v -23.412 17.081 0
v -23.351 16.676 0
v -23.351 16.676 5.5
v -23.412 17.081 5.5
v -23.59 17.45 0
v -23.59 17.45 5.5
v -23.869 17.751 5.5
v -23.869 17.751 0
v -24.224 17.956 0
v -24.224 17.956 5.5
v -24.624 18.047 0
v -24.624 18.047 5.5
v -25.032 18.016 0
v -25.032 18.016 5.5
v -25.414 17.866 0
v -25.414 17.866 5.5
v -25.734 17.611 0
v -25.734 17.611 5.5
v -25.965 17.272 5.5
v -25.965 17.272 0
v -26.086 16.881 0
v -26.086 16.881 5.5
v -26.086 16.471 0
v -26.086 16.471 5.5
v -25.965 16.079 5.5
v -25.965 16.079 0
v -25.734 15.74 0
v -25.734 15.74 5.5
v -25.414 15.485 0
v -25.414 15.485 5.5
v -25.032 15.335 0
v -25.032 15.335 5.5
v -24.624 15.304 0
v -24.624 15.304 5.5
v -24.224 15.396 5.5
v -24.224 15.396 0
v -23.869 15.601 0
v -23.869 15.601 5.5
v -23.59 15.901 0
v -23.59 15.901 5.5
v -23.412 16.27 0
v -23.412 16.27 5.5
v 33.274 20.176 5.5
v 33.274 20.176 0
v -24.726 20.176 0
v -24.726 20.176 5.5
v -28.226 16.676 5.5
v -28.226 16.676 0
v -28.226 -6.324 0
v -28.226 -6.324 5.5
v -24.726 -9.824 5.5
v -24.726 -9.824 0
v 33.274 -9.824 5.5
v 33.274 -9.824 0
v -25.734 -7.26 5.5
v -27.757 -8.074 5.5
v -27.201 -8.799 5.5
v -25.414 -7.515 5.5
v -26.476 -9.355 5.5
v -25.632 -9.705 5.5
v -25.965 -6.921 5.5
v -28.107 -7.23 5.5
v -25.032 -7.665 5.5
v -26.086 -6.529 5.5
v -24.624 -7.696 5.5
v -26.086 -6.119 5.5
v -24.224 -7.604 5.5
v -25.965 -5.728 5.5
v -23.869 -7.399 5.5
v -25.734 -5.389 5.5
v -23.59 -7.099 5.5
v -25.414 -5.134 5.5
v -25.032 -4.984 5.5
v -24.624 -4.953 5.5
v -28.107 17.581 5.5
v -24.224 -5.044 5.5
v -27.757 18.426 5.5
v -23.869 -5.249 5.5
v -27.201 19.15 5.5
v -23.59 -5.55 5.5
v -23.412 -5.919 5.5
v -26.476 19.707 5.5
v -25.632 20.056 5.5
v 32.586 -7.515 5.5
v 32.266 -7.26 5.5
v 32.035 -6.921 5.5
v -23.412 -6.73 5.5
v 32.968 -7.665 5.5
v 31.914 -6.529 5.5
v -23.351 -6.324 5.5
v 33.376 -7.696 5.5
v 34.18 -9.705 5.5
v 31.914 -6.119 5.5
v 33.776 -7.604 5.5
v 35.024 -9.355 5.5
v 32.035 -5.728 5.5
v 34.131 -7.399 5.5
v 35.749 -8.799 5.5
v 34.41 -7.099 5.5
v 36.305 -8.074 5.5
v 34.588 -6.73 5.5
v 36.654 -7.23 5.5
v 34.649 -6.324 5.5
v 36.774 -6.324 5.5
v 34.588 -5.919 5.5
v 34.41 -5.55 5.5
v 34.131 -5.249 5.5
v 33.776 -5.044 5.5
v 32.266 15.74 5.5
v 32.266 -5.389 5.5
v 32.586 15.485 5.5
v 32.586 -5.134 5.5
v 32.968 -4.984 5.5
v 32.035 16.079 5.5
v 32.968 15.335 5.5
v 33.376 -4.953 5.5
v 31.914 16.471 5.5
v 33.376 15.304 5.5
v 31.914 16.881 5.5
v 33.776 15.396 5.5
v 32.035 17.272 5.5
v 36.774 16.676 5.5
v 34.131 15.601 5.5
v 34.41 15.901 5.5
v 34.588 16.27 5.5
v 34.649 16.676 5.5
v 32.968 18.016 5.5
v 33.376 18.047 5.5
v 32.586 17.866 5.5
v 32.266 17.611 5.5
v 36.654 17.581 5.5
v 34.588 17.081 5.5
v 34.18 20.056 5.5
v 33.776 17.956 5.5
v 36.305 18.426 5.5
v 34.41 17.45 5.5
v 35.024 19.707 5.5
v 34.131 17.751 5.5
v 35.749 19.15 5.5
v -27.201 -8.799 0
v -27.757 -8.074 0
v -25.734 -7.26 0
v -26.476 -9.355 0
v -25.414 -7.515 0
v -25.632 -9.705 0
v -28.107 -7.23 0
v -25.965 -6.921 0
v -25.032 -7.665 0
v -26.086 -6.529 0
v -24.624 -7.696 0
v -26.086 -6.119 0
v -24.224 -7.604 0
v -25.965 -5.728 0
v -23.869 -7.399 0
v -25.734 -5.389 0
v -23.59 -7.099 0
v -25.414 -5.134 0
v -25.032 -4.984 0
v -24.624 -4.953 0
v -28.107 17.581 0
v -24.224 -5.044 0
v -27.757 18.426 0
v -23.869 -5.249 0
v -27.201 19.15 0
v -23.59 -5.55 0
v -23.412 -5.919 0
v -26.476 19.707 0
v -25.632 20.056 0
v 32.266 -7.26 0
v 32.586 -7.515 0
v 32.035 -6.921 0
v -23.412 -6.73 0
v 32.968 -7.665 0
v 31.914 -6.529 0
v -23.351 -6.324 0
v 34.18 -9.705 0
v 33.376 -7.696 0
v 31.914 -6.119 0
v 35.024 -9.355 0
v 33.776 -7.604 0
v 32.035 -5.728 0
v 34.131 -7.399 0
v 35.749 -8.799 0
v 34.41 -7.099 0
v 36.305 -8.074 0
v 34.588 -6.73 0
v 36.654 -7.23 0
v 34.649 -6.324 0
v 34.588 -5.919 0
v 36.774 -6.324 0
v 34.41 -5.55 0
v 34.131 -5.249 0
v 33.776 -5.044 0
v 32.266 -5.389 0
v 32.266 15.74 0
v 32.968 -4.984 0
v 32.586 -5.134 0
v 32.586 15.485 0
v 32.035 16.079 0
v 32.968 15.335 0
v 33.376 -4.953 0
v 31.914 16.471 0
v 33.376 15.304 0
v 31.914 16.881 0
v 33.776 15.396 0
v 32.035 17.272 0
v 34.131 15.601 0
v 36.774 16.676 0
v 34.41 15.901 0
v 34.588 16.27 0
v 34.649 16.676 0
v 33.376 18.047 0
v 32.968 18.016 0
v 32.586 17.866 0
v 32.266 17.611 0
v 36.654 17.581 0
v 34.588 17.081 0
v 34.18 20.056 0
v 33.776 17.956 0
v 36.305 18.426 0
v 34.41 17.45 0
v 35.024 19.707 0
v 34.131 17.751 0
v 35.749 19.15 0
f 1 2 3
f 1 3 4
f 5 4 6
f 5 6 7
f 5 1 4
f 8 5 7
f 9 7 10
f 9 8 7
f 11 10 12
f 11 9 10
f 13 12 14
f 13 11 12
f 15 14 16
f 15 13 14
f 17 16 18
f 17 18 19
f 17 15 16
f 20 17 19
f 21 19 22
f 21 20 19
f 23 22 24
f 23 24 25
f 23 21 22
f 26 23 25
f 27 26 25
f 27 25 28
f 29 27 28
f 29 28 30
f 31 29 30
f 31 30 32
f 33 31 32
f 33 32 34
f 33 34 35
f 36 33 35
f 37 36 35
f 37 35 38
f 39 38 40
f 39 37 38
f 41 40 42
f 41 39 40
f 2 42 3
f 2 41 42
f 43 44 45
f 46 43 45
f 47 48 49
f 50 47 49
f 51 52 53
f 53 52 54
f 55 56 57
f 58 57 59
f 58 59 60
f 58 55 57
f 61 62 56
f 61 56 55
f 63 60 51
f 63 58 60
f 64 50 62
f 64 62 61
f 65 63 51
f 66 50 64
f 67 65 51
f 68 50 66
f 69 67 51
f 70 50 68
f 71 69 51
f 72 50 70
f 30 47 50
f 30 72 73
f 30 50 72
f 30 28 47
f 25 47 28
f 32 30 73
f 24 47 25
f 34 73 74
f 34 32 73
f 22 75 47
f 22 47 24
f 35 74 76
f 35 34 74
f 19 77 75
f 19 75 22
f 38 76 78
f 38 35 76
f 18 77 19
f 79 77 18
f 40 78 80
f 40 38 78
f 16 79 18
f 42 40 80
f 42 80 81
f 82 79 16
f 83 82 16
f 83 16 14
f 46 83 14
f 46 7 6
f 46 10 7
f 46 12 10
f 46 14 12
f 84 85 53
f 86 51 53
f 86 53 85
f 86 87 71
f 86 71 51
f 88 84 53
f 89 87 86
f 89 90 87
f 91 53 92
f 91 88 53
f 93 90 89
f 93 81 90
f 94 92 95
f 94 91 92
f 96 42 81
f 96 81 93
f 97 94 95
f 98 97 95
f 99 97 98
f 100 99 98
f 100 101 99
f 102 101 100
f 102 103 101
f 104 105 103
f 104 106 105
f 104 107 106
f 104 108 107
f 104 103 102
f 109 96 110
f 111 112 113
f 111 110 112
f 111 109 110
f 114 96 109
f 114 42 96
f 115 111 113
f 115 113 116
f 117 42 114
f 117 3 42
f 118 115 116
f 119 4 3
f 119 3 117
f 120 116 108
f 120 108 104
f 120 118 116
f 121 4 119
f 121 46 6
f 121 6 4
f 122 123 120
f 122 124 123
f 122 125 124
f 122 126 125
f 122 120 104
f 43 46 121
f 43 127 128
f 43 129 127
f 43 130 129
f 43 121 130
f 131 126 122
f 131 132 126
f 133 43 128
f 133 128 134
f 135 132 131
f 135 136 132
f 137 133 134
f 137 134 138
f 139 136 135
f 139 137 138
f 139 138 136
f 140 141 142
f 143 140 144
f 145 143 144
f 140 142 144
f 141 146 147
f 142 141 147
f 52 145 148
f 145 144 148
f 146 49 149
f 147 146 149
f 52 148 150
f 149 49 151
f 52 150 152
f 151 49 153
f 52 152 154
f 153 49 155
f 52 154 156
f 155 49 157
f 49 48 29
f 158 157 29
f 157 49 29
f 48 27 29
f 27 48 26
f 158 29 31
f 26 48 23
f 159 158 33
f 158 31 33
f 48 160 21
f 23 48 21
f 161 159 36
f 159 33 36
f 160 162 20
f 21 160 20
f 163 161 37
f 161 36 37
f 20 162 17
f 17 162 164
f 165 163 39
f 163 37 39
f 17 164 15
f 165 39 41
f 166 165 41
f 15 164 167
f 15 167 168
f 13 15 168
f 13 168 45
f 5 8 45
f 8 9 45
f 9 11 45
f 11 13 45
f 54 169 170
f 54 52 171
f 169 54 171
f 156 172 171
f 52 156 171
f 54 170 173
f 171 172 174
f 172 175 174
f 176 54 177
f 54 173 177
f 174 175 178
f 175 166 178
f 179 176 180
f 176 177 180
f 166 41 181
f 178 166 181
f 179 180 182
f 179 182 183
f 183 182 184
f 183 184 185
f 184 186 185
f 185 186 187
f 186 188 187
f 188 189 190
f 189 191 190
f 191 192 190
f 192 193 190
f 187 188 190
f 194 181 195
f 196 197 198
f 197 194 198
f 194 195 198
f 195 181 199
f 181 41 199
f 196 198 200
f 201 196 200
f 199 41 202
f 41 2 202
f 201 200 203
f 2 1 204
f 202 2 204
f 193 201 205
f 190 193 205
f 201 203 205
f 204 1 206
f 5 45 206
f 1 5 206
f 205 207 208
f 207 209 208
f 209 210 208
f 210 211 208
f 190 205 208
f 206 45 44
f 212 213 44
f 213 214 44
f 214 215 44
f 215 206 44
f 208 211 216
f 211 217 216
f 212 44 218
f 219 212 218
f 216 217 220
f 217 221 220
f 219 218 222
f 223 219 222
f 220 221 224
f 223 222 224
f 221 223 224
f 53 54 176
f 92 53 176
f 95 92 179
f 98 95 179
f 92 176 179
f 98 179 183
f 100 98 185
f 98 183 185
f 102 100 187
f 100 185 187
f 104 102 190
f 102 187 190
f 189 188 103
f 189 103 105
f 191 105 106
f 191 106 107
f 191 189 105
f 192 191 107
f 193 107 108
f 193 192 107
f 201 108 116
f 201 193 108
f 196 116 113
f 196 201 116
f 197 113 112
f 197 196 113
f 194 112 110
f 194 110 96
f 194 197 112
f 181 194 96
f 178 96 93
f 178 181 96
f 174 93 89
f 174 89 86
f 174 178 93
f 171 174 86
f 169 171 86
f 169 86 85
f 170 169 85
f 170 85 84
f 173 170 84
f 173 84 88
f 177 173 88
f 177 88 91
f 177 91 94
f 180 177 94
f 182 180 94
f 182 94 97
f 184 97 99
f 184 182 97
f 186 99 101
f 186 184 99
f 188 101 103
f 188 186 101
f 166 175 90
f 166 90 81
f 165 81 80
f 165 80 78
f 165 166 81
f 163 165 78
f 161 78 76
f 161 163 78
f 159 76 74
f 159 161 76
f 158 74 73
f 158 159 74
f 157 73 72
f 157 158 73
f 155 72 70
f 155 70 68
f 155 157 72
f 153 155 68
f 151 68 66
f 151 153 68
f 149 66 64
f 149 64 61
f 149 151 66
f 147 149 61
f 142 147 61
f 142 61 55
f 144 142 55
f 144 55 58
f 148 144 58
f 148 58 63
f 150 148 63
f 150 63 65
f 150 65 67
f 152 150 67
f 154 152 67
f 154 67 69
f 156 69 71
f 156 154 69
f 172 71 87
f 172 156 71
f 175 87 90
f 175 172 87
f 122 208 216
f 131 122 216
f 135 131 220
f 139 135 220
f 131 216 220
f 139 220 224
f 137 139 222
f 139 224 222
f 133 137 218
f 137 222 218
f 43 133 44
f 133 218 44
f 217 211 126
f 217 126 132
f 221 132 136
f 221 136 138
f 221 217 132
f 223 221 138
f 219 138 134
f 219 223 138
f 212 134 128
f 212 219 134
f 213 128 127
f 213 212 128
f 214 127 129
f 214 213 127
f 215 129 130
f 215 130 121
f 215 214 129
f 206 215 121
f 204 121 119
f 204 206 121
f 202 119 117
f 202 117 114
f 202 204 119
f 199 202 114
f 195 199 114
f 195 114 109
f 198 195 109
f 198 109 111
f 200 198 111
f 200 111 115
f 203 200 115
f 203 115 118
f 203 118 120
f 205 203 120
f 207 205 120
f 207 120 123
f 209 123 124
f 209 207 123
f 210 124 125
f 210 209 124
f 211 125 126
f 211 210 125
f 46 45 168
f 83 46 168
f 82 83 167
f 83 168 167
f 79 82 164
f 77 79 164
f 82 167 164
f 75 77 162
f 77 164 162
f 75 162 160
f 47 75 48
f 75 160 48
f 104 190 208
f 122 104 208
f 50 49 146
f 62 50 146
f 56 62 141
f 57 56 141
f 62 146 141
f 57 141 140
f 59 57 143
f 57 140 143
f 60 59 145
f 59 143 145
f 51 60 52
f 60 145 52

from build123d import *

# Parameters (mm, degrees)
F0_R     = 1.75
F0_R_2   = 1.375
F1_DEPTH = 5.5


with BuildPart() as f1:
    # F0 (on Top) → F1 (new body)
    with BuildSketch(Plane.XY):
        with BuildLine():
            Line((33.2736441009, 20.1755892562), (-24.7263558991, 20.1755892562))
            ThreePointArc((-24.7263558991, 20.1755892562), (-27.2012296333, 19.1504629903), (-28.2263558991, 16.6755892562))
            Line((-28.2263558991, 16.6755892562), (-28.2263558991, -6.3244107438))
            ThreePointArc((-28.2263558991, -6.3244107438), (-27.2012296333, -8.799284478), (-24.7263558991, -9.8244107438))
            Line((-24.7263558991, -9.8244107438), (33.2736441009, -9.8244107438))
            ThreePointArc((33.2736441009, -9.8244107438), (35.748517835, -8.799284478), (36.7736441009, -6.3244107438))
            Line((36.7736441009, -6.3244107438), (36.7736441009, 16.6755892562))
            ThreePointArc((36.7736441009, 16.6755892562), (35.748517835, 19.1504629903), (33.2736441009, 20.1755892562))
        make_face()
        with Locations((-24.7263558991, -6.3244107438)):
            Circle(F0_R, mode=Mode.SUBTRACT)
        with Locations((33.2736441009, -6.3244107438)):
            Circle(F0_R, mode=Mode.SUBTRACT)
        with Locations((-24.7263558991, 16.6755892562)):
            Circle(F0_R, mode=Mode.SUBTRACT)
        with Locations((33.2736441009, 16.6755892562)):
            Circle(F0_R, mode=Mode.SUBTRACT)
        with Locations((-24.7263558991, -6.3244107438)):
            Circle(F0_R)
        with Locations((-24.7263558991, -6.3244107438)):
            Circle(F0_R_2, mode=Mode.SUBTRACT)
        with Locations((-24.7263558991, 16.6755892562)):
            Circle(F0_R)
        with Locations((-24.7263558991, 16.6755892562)):
            Circle(F0_R_2, mode=Mode.SUBTRACT)
        with Locations((33.2736441009, -6.3244107438)):
            Circle(F0_R)
        with Locations((33.2736441009, -6.3244107438)):
            Circle(F0_R_2, mode=Mode.SUBTRACT)
        with Locations((33.2736441009, 16.6755892562)):
            Circle(F0_R)
        with Locations((33.2736441009, 16.6755892562)):
            Circle(F0_R_2, mode=Mode.SUBTRACT)
    extrude(amount=F1_DEPTH)


solid = f1.part
